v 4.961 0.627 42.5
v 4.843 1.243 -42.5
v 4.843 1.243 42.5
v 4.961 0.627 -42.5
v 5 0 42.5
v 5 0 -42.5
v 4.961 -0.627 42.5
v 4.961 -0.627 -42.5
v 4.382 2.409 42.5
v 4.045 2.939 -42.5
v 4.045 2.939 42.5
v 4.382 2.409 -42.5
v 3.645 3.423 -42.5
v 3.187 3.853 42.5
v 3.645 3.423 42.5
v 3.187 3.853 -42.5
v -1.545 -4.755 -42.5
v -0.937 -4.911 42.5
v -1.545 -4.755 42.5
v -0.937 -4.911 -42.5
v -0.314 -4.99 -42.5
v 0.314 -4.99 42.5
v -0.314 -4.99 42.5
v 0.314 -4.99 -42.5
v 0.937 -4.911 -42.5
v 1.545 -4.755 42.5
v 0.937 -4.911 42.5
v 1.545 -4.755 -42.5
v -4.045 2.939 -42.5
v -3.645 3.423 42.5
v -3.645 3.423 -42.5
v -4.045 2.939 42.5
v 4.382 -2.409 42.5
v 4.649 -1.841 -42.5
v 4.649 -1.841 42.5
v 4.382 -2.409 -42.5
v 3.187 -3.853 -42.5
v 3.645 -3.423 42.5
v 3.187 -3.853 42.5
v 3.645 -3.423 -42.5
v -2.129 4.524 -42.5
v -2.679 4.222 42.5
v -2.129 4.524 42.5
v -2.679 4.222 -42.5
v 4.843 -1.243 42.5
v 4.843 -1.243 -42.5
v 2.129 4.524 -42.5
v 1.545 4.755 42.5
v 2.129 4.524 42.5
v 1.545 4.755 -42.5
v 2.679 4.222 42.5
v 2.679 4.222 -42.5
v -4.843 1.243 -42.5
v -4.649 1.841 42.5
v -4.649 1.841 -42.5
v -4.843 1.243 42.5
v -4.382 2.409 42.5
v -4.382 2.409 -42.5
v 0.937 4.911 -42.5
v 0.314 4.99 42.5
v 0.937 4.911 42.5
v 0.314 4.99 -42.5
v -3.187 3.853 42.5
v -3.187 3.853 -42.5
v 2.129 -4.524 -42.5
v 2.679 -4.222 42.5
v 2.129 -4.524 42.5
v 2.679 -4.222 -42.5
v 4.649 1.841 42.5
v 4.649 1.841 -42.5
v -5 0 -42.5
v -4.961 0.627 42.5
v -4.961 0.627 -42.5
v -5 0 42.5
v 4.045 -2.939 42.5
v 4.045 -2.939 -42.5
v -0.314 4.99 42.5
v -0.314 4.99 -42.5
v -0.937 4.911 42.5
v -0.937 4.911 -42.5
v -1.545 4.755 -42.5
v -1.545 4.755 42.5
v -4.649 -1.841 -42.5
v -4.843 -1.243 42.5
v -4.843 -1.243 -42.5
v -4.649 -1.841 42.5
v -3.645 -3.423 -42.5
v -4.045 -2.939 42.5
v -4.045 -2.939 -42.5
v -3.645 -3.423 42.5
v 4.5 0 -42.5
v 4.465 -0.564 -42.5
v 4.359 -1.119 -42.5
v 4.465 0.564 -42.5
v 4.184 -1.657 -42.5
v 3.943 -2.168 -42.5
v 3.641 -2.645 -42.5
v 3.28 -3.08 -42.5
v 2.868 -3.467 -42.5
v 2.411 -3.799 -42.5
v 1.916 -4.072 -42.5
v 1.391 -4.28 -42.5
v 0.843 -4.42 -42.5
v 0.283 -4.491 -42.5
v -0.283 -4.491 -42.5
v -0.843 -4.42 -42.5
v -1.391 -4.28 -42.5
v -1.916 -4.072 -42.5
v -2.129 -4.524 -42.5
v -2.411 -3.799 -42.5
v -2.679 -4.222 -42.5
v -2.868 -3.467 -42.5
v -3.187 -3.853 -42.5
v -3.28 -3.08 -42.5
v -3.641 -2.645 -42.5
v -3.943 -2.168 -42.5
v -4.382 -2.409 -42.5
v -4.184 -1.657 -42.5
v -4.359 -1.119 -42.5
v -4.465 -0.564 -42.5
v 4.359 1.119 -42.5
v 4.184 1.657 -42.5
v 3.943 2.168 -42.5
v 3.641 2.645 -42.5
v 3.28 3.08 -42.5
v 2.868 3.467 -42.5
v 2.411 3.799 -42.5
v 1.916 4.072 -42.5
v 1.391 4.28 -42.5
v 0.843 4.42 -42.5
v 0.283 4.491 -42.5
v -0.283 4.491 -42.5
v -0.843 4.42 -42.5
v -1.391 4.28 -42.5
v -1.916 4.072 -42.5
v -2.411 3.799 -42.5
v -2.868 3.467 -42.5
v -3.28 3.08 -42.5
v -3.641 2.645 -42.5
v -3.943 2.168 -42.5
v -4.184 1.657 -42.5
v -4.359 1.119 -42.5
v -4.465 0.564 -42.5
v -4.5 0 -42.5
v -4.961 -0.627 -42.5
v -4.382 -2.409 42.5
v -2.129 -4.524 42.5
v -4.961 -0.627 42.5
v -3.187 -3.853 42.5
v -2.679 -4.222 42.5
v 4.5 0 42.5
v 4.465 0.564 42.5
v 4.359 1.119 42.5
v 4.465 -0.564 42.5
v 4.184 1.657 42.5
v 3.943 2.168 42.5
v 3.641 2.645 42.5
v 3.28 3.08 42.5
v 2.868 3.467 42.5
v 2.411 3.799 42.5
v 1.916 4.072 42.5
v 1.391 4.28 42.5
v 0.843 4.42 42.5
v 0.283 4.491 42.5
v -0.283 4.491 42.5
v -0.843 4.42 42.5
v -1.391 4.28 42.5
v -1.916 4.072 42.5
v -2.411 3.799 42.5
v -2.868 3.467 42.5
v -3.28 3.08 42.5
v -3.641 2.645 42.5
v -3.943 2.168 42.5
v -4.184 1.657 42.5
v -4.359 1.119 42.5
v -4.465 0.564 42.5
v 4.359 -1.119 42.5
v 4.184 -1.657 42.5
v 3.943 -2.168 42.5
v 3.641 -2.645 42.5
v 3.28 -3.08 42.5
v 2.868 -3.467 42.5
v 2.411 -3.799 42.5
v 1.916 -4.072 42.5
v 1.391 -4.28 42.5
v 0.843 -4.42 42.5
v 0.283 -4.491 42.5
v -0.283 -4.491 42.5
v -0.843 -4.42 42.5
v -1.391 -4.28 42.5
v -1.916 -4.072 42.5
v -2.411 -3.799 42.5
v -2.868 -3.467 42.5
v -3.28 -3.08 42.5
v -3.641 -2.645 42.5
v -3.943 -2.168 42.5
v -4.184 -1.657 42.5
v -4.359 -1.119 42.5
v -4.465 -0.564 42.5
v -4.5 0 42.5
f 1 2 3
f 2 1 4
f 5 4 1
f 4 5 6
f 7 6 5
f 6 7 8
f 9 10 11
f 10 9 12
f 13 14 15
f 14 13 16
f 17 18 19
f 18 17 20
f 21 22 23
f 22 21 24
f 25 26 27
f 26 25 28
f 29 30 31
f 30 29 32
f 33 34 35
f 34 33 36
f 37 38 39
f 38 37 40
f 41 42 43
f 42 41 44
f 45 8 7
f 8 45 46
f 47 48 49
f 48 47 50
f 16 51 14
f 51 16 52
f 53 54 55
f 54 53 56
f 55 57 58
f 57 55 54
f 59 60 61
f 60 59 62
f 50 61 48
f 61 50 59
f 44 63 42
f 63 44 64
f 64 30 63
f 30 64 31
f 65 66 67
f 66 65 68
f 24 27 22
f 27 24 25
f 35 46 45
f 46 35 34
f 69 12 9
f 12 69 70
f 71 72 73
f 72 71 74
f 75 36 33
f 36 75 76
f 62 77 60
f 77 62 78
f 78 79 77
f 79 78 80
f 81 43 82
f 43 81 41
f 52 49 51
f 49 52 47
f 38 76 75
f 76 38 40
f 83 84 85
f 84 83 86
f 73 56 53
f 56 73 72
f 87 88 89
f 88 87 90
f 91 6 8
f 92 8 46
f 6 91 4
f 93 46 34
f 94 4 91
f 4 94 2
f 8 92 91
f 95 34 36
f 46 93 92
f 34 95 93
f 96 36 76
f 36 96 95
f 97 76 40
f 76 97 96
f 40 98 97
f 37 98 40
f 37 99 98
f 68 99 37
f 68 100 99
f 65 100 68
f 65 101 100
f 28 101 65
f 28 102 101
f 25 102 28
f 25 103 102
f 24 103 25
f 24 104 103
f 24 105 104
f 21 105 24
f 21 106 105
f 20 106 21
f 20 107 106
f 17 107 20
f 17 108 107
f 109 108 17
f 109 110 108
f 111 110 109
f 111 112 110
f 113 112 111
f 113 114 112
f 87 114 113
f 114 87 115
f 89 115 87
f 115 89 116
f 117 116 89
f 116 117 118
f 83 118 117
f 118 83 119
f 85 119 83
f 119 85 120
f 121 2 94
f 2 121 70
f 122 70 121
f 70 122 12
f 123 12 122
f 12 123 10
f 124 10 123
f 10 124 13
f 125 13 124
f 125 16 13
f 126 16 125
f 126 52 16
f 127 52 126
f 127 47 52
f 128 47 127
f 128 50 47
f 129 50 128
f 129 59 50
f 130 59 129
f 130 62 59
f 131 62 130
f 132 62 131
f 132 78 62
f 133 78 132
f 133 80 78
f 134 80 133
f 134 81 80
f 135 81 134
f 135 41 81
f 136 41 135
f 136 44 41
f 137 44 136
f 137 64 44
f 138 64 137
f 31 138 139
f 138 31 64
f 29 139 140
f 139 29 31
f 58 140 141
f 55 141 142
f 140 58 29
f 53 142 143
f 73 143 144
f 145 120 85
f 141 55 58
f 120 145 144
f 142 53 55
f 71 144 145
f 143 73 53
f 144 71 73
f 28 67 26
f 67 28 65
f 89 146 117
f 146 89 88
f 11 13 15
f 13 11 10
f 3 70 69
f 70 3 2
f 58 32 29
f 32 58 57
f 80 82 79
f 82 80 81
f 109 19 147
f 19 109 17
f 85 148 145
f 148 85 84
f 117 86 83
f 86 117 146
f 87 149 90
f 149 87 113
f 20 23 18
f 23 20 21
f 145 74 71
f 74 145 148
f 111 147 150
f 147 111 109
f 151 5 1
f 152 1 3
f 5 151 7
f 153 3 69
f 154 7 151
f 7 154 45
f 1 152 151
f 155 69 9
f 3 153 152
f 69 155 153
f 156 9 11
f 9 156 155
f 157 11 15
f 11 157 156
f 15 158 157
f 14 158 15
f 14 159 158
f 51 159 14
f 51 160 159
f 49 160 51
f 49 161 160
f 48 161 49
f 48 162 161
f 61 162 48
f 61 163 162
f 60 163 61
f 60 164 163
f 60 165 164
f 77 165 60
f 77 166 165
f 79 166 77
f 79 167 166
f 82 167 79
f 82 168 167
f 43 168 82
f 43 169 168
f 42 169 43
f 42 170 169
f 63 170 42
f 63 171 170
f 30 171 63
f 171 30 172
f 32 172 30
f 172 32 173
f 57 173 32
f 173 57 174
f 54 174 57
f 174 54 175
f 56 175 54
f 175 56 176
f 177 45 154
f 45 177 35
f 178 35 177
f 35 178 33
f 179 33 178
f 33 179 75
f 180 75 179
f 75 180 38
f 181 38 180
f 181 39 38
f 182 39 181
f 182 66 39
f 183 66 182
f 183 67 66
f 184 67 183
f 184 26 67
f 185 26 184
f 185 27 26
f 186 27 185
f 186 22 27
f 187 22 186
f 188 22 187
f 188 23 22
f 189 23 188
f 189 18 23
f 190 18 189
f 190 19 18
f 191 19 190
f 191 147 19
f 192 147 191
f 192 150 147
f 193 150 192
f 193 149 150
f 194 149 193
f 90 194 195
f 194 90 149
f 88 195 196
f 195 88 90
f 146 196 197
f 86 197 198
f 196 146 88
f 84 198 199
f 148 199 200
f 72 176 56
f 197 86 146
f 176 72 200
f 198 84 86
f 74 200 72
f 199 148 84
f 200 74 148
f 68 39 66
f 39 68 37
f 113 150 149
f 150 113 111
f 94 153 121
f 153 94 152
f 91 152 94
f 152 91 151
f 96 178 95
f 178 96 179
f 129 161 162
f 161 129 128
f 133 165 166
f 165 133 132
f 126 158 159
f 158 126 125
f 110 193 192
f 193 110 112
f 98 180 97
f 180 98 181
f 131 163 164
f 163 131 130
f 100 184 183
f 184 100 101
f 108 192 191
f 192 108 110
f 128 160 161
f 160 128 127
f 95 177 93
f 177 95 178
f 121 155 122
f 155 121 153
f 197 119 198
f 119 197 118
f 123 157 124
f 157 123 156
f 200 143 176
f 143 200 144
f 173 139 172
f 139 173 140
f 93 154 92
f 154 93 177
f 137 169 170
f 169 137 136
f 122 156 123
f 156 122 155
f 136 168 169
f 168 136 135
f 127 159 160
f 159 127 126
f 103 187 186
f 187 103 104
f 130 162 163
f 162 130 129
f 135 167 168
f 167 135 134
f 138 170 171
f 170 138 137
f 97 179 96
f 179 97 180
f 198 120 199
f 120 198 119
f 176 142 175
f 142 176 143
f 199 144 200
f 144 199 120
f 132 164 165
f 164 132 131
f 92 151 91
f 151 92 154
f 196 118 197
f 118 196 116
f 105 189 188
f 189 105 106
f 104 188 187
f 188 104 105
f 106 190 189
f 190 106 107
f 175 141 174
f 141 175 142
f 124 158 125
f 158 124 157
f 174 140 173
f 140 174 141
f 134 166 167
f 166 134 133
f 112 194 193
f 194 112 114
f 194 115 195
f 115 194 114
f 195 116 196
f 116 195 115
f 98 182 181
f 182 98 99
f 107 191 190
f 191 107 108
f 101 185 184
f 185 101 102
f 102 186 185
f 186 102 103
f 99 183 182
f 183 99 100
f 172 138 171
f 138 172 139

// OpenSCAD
$fn = 50;


difference() {
	union() {
		translate(v = [0, 0, -42.5000000000]) {
			cylinder(h = 85, r = 5.0000000000);
		}
	}
	union() {
		translate(v = [0, 0, -100.0000000000]) {
			cylinder(h = 200, r = 4.5000000000);
		}
	}
}
